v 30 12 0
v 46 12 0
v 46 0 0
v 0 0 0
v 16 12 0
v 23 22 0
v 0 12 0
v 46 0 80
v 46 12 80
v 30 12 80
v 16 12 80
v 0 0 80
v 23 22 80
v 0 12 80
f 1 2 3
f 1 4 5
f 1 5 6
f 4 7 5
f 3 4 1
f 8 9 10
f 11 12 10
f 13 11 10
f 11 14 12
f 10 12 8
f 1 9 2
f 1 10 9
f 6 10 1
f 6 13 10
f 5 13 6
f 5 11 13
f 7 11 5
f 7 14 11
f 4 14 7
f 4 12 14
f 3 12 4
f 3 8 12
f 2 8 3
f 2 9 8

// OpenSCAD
$fn = 32;

// ----------------------------------------------------------------------
// V guide rail: vrib, 46 mm wide
// ----------------------------------------------------------------------

// --- parameters (mm) ---
rail_w = 46;              // rail width, X
base_t = 12;              // base plate thickness
v_depth = 10;             // V feature depth / height
v_half_w = 7;             // half width of the V at the base face
plate_t = 80;             // rail length, Z (the extrusion height)

profile = [[0, 0], [46, 0], [46, 12], [30, 12], [23, 22], [16, 12], [0, 12]];  // primary outline, 7 points, counter clockwise

// --- the one profile operation ---
linear_extrude(height = plate_t) polygon(points = profile);
